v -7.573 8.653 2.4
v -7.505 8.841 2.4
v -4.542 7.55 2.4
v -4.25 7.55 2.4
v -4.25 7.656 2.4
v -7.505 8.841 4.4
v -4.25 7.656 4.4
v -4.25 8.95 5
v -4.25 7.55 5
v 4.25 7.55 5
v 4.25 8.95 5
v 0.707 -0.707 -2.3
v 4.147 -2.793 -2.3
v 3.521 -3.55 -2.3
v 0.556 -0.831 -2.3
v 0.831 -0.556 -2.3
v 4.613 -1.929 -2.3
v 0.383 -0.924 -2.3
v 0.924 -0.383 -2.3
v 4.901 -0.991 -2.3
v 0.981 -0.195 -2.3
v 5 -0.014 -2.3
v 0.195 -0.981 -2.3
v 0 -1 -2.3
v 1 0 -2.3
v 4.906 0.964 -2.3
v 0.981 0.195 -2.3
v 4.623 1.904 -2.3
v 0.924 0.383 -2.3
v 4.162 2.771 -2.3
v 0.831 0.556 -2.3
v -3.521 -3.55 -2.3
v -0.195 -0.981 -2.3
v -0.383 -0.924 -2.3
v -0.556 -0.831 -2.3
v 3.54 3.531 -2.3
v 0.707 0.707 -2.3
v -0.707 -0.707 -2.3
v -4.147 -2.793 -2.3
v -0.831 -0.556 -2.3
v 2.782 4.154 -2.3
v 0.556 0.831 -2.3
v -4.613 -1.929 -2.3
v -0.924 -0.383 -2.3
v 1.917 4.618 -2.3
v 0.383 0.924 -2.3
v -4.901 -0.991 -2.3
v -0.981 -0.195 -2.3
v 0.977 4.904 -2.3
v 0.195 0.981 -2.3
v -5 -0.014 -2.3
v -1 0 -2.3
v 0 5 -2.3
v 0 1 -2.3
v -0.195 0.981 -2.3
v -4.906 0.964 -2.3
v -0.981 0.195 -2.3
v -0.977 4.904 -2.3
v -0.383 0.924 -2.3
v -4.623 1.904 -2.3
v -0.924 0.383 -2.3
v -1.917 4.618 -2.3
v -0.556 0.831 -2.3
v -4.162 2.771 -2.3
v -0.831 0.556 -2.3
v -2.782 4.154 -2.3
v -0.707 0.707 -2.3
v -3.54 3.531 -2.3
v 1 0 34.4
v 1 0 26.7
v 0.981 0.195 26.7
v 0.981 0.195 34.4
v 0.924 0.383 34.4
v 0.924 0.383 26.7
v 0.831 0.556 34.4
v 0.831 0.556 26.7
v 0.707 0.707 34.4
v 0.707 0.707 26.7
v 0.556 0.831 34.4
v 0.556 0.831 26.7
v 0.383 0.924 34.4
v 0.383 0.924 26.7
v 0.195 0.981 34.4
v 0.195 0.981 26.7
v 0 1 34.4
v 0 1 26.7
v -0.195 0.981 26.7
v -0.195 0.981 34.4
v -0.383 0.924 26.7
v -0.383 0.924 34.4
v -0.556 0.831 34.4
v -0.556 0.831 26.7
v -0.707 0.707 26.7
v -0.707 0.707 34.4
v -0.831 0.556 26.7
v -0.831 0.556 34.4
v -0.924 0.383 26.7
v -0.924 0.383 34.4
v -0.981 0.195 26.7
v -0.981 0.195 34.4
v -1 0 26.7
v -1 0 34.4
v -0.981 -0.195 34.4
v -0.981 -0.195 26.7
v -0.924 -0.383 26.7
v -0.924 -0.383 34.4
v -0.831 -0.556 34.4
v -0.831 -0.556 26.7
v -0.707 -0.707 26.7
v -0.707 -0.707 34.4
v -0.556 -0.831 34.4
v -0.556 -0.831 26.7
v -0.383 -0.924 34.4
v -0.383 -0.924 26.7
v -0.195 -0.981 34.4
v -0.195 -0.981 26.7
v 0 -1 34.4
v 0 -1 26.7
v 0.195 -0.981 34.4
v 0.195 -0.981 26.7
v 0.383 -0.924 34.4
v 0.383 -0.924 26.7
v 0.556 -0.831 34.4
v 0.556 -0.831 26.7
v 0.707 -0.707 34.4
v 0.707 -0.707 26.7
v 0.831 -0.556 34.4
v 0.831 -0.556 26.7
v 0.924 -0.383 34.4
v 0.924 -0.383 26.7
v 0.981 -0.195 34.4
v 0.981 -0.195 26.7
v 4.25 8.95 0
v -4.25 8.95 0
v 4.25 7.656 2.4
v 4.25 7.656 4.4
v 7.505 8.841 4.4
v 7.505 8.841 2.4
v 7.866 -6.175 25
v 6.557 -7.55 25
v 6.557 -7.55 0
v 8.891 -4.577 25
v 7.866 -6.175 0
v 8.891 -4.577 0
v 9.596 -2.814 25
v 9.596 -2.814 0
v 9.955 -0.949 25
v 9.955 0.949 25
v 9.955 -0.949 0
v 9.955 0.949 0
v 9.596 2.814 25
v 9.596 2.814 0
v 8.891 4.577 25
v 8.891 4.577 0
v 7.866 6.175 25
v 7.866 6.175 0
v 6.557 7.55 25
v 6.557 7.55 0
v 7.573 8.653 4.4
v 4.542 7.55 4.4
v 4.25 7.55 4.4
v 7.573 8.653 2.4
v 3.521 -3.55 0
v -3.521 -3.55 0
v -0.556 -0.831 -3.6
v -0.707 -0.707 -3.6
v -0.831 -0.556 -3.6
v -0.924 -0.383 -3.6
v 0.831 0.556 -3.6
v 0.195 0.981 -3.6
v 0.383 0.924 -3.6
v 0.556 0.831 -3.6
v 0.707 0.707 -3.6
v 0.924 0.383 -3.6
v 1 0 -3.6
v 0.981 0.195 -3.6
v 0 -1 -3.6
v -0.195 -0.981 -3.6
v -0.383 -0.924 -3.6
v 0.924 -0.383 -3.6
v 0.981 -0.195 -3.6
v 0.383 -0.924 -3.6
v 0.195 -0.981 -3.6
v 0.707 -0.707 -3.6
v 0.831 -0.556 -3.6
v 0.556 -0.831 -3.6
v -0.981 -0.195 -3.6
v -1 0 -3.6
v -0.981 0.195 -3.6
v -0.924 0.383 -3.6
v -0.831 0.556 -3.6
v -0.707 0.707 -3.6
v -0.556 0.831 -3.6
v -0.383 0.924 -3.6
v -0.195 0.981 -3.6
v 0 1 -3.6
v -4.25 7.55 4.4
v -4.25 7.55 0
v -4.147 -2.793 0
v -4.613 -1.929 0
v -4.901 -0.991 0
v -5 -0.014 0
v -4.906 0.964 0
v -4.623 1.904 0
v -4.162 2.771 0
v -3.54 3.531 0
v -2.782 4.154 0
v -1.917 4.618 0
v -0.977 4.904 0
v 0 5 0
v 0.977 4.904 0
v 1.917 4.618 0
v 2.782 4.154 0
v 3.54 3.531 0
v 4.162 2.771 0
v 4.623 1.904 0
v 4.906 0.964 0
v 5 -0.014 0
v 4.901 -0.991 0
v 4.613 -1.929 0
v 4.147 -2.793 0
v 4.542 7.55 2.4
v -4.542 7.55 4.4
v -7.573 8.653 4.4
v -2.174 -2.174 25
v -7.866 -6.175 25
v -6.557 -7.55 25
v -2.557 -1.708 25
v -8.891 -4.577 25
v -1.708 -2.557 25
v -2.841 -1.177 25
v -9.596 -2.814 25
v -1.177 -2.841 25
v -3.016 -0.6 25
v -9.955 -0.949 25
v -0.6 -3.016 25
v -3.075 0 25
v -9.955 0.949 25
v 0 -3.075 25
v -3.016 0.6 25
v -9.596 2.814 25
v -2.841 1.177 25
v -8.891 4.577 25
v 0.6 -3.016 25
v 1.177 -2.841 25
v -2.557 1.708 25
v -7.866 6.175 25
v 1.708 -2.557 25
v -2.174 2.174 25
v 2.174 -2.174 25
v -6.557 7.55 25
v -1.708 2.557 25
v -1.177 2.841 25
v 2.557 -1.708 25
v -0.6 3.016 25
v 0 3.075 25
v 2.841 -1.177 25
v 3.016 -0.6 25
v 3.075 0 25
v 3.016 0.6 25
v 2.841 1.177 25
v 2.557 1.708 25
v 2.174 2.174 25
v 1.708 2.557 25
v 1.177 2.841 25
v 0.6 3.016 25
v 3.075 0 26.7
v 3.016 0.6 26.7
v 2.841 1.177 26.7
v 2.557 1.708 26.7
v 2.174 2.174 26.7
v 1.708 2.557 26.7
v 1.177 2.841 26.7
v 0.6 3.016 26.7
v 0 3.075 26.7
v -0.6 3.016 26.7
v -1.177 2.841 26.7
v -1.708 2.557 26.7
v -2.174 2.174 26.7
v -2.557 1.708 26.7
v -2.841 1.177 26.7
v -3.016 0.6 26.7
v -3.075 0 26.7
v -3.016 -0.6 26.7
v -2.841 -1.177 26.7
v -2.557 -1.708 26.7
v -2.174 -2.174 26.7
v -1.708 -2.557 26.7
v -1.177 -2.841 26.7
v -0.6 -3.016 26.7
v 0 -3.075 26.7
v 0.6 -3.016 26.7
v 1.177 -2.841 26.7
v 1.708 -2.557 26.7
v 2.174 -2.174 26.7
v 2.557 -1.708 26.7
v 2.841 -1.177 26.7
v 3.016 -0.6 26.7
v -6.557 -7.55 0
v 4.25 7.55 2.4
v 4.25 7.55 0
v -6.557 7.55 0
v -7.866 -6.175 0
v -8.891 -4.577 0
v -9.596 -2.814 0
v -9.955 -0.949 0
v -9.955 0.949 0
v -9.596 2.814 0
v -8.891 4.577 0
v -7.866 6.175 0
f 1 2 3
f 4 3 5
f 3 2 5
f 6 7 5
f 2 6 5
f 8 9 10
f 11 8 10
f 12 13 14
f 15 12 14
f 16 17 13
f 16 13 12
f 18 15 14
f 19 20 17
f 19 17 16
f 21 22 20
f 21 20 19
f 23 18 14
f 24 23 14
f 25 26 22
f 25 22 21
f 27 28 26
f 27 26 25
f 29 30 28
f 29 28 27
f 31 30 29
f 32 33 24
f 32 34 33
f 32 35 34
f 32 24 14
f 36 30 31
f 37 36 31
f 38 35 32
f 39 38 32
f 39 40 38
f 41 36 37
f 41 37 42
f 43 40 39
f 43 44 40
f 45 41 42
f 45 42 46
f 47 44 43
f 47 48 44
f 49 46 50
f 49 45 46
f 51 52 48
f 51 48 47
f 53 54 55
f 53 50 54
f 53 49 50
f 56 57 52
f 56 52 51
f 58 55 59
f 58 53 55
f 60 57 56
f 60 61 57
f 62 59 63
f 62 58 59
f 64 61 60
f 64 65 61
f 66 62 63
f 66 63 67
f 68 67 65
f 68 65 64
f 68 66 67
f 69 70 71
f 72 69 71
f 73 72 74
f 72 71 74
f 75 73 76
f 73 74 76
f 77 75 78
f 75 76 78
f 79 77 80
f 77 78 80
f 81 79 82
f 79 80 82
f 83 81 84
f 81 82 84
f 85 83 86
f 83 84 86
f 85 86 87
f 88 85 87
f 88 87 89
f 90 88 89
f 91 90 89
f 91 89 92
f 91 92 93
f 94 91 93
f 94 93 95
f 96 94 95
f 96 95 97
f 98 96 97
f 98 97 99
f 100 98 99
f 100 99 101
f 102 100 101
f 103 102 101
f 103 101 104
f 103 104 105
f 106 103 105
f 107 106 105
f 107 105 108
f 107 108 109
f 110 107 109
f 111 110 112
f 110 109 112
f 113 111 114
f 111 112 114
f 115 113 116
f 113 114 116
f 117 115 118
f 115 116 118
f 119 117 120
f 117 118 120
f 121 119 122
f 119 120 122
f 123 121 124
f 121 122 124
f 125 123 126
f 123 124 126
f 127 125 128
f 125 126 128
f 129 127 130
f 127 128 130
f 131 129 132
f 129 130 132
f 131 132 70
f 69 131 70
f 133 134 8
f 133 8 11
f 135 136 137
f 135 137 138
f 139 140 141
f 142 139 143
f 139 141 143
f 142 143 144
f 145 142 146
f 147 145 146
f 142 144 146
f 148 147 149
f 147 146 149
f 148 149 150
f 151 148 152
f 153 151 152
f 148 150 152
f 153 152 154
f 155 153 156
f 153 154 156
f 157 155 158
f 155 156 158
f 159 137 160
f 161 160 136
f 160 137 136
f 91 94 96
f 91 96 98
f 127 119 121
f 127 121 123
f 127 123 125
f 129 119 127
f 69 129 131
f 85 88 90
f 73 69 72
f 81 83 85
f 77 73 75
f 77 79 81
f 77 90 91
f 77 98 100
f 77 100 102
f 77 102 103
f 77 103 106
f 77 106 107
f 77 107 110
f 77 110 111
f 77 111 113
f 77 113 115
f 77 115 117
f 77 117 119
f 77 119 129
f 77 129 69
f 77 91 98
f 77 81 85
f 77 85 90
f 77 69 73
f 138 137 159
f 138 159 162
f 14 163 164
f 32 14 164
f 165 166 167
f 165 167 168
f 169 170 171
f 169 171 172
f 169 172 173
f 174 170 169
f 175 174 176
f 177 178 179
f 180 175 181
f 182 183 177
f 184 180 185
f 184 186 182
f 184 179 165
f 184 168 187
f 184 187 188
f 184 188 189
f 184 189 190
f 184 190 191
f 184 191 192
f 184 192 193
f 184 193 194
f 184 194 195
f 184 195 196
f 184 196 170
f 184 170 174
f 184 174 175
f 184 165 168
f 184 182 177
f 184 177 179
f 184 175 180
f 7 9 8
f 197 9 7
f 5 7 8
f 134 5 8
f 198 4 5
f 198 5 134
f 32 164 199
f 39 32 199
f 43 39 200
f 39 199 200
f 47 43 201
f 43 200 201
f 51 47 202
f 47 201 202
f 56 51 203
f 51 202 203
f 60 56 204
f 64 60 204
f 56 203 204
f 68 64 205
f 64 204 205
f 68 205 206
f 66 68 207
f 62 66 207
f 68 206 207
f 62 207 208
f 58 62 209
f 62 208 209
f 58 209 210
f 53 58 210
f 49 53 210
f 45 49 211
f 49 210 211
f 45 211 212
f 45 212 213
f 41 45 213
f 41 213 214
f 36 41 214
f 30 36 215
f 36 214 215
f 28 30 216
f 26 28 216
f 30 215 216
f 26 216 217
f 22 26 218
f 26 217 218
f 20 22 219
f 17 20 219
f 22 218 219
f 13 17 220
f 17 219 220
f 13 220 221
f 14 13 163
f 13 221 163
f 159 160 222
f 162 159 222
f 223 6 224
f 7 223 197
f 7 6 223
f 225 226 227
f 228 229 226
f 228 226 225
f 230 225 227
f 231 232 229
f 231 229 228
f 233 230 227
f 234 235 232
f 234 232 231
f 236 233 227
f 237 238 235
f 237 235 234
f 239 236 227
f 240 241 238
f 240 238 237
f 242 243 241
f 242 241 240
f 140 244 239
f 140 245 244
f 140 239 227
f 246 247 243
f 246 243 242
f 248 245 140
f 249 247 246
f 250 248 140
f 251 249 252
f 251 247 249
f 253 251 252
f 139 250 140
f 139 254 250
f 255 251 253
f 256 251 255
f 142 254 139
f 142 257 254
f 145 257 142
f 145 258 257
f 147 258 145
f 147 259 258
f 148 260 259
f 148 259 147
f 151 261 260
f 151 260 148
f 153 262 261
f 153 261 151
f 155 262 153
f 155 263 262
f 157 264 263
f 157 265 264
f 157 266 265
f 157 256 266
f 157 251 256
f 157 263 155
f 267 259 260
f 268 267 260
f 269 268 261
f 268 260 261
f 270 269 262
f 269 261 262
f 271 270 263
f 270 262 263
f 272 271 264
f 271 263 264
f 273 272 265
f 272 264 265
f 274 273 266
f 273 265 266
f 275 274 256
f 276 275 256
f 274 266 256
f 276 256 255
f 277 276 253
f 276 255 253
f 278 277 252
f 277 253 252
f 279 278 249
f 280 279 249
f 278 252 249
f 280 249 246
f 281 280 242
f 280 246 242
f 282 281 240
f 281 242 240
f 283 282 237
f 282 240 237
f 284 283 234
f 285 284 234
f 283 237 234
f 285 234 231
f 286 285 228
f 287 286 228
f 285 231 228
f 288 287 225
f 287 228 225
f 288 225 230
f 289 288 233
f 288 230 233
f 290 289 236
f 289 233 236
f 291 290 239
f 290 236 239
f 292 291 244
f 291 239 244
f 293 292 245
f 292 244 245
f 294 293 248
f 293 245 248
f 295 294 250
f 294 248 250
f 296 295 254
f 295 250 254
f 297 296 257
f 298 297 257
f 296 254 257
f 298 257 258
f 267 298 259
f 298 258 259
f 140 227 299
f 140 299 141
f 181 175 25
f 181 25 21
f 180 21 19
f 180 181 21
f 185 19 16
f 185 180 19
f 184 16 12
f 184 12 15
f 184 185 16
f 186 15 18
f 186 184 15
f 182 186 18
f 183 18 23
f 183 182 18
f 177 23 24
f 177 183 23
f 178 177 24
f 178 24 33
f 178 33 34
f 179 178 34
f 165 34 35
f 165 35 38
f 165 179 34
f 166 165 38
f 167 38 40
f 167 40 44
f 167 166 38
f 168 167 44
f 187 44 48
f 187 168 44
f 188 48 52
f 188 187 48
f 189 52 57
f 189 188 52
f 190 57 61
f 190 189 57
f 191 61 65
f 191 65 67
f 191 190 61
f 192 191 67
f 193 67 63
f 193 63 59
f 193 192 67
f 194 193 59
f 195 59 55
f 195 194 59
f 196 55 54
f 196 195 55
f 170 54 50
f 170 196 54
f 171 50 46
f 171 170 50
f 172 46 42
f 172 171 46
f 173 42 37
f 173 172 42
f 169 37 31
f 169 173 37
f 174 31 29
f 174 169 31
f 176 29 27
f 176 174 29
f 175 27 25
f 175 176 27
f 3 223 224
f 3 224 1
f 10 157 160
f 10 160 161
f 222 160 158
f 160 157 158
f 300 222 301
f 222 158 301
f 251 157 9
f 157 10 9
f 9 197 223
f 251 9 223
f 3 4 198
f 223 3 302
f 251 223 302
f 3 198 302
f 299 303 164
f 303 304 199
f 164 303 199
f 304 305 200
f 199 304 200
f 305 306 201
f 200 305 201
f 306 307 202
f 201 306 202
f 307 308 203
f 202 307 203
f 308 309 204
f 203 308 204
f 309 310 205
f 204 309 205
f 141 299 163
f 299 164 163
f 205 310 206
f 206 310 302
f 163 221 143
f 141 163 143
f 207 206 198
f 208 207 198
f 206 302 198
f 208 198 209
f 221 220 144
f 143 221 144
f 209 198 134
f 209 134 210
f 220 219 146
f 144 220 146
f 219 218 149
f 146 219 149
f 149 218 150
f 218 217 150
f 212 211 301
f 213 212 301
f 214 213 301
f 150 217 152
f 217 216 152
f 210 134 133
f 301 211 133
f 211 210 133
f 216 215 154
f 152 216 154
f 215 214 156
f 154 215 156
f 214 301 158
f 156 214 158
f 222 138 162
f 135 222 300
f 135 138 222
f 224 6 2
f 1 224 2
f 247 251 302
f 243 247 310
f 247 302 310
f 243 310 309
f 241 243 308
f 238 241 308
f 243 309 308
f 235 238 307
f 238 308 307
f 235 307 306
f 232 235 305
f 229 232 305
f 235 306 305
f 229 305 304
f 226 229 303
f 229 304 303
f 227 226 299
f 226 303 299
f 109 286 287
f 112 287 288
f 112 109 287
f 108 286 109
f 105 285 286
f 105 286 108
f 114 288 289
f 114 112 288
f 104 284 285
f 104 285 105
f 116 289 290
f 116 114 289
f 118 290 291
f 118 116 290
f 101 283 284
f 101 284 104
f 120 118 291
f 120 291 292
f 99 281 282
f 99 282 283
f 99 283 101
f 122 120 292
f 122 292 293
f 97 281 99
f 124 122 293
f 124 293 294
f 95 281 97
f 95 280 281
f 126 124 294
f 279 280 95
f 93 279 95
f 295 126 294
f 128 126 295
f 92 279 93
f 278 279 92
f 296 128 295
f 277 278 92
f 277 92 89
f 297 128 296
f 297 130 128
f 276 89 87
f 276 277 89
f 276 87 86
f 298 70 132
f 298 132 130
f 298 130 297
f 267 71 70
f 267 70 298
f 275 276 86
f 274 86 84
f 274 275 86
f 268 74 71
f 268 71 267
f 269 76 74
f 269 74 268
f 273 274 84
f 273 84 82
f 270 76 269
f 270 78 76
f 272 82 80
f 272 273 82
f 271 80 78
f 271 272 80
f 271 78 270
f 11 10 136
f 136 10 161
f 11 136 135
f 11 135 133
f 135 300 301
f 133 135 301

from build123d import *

# Parameters (mm, degrees)
EXTRUDE_1_DEPTH = 25
SKETCH_3_R      = 1
EXTRUDE_2_DEPTH = 9.4
SKETCH_4_R      = 3.075
EXTRUDE_3_DEPTH = 1.7
EXTRUDE_4_DEPTH = 2.3
EXTRUDE_START   = 1.3
SKETCH_6_R      = 1
EXTRUDE_5_DEPTH = 1.3
SKETCH_8_W      = 8.5
SKETCH_8_H      = 5
EXTRUDE_6_DEPTH = 1.4
SKETCH_9_W      = 2
SKETCH_9_H      = 3.5
EXTRUDE_7_DEPTH = 0.1


with BuildPart() as part:
    # 草图2 → 凸台-拉伸1 (new body)
    with BuildSketch(Plane.XY):
        with BuildLine():
            Line((-6.557247898, -7.55), (6.557247898, -7.55))
            ThreePointArc((6.557247898, -7.55), (10, 0), (6.557247898, 7.55))
            Line((6.557247898, 7.55), (-6.557247898, 7.55))
            ThreePointArc((-6.557247898, 7.55), (-10, 0), (-6.557247898, -7.55))
        make_face()
    extrude(amount=EXTRUDE_1_DEPTH)

    # 草图3 → 凸台-拉伸2 (add)
    with BuildSketch(Plane.XY.offset(25)):
        Circle(SKETCH_3_R)
    extrude(amount=EXTRUDE_2_DEPTH)

    # 草图4 → 凸台-拉伸3 (add)
    with BuildSketch(Plane.XY.offset(25)):
        Circle(SKETCH_4_R)
    extrude(amount=EXTRUDE_3_DEPTH)

    # 草图5 → 凸台-拉伸4 (add)
    with BuildSketch(Plane(origin=(0, 0, 0), x_dir=(-1, 0, 0), z_dir=(0, 0, -1))):
        with BuildLine():
            Line((-3.521008378, -3.55), (3.521008378, -3.55))
            ThreePointArc((3.521008378, -3.55), (0, 5), (-3.521008378, -3.55))
        make_face()
    extrude(amount=EXTRUDE_4_DEPTH)

    # 草图6 → 凸台-拉伸5 (add)
    with BuildSketch(Plane(origin=(0, 0, -2.3), x_dir=(-1, 0, 0), z_dir=(0, 0, -1)).offset(EXTRUDE_START)):
        with Locations(Location((0, 0, 0), (0, 0, 180))):
            Circle(SKETCH_6_R)
    extrude(amount=-EXTRUDE_5_DEPTH)

    # 草图8 → 凸台-拉伸6 (add)
    with BuildSketch(Plane(origin=(0, 7.55, 0), x_dir=(1, 0, 0), z_dir=(0, 1, 0))):
        with Locations((0, -2.5)):
            Rectangle(SKETCH_8_W, SKETCH_8_H)
    extrude(amount=EXTRUDE_6_DEPTH)

    # 草图9 → 凸台-拉伸7 (add, symmetric)
    with BuildSketch(Plane(origin=(-1.929367668, 5.300894102, 0), x_dir=(0, 0, -1), z_dir=(-0.34202014332566943, 0.9396926207859081, 0))):
        with Locations((-3.4, -8.32594572)):
            Rectangle(SKETCH_9_W, SKETCH_9_H)
    extrude_7 = extrude(amount=EXTRUDE_7_DEPTH, both=True)

    # 镜向1: 凸台-拉伸7 across plane
    add(extrude_7.mirror(Plane(origin=(0, 0, 0), x_dir=(0, 0, 1), z_dir=(1, 0, 0))))


solid = part.part
